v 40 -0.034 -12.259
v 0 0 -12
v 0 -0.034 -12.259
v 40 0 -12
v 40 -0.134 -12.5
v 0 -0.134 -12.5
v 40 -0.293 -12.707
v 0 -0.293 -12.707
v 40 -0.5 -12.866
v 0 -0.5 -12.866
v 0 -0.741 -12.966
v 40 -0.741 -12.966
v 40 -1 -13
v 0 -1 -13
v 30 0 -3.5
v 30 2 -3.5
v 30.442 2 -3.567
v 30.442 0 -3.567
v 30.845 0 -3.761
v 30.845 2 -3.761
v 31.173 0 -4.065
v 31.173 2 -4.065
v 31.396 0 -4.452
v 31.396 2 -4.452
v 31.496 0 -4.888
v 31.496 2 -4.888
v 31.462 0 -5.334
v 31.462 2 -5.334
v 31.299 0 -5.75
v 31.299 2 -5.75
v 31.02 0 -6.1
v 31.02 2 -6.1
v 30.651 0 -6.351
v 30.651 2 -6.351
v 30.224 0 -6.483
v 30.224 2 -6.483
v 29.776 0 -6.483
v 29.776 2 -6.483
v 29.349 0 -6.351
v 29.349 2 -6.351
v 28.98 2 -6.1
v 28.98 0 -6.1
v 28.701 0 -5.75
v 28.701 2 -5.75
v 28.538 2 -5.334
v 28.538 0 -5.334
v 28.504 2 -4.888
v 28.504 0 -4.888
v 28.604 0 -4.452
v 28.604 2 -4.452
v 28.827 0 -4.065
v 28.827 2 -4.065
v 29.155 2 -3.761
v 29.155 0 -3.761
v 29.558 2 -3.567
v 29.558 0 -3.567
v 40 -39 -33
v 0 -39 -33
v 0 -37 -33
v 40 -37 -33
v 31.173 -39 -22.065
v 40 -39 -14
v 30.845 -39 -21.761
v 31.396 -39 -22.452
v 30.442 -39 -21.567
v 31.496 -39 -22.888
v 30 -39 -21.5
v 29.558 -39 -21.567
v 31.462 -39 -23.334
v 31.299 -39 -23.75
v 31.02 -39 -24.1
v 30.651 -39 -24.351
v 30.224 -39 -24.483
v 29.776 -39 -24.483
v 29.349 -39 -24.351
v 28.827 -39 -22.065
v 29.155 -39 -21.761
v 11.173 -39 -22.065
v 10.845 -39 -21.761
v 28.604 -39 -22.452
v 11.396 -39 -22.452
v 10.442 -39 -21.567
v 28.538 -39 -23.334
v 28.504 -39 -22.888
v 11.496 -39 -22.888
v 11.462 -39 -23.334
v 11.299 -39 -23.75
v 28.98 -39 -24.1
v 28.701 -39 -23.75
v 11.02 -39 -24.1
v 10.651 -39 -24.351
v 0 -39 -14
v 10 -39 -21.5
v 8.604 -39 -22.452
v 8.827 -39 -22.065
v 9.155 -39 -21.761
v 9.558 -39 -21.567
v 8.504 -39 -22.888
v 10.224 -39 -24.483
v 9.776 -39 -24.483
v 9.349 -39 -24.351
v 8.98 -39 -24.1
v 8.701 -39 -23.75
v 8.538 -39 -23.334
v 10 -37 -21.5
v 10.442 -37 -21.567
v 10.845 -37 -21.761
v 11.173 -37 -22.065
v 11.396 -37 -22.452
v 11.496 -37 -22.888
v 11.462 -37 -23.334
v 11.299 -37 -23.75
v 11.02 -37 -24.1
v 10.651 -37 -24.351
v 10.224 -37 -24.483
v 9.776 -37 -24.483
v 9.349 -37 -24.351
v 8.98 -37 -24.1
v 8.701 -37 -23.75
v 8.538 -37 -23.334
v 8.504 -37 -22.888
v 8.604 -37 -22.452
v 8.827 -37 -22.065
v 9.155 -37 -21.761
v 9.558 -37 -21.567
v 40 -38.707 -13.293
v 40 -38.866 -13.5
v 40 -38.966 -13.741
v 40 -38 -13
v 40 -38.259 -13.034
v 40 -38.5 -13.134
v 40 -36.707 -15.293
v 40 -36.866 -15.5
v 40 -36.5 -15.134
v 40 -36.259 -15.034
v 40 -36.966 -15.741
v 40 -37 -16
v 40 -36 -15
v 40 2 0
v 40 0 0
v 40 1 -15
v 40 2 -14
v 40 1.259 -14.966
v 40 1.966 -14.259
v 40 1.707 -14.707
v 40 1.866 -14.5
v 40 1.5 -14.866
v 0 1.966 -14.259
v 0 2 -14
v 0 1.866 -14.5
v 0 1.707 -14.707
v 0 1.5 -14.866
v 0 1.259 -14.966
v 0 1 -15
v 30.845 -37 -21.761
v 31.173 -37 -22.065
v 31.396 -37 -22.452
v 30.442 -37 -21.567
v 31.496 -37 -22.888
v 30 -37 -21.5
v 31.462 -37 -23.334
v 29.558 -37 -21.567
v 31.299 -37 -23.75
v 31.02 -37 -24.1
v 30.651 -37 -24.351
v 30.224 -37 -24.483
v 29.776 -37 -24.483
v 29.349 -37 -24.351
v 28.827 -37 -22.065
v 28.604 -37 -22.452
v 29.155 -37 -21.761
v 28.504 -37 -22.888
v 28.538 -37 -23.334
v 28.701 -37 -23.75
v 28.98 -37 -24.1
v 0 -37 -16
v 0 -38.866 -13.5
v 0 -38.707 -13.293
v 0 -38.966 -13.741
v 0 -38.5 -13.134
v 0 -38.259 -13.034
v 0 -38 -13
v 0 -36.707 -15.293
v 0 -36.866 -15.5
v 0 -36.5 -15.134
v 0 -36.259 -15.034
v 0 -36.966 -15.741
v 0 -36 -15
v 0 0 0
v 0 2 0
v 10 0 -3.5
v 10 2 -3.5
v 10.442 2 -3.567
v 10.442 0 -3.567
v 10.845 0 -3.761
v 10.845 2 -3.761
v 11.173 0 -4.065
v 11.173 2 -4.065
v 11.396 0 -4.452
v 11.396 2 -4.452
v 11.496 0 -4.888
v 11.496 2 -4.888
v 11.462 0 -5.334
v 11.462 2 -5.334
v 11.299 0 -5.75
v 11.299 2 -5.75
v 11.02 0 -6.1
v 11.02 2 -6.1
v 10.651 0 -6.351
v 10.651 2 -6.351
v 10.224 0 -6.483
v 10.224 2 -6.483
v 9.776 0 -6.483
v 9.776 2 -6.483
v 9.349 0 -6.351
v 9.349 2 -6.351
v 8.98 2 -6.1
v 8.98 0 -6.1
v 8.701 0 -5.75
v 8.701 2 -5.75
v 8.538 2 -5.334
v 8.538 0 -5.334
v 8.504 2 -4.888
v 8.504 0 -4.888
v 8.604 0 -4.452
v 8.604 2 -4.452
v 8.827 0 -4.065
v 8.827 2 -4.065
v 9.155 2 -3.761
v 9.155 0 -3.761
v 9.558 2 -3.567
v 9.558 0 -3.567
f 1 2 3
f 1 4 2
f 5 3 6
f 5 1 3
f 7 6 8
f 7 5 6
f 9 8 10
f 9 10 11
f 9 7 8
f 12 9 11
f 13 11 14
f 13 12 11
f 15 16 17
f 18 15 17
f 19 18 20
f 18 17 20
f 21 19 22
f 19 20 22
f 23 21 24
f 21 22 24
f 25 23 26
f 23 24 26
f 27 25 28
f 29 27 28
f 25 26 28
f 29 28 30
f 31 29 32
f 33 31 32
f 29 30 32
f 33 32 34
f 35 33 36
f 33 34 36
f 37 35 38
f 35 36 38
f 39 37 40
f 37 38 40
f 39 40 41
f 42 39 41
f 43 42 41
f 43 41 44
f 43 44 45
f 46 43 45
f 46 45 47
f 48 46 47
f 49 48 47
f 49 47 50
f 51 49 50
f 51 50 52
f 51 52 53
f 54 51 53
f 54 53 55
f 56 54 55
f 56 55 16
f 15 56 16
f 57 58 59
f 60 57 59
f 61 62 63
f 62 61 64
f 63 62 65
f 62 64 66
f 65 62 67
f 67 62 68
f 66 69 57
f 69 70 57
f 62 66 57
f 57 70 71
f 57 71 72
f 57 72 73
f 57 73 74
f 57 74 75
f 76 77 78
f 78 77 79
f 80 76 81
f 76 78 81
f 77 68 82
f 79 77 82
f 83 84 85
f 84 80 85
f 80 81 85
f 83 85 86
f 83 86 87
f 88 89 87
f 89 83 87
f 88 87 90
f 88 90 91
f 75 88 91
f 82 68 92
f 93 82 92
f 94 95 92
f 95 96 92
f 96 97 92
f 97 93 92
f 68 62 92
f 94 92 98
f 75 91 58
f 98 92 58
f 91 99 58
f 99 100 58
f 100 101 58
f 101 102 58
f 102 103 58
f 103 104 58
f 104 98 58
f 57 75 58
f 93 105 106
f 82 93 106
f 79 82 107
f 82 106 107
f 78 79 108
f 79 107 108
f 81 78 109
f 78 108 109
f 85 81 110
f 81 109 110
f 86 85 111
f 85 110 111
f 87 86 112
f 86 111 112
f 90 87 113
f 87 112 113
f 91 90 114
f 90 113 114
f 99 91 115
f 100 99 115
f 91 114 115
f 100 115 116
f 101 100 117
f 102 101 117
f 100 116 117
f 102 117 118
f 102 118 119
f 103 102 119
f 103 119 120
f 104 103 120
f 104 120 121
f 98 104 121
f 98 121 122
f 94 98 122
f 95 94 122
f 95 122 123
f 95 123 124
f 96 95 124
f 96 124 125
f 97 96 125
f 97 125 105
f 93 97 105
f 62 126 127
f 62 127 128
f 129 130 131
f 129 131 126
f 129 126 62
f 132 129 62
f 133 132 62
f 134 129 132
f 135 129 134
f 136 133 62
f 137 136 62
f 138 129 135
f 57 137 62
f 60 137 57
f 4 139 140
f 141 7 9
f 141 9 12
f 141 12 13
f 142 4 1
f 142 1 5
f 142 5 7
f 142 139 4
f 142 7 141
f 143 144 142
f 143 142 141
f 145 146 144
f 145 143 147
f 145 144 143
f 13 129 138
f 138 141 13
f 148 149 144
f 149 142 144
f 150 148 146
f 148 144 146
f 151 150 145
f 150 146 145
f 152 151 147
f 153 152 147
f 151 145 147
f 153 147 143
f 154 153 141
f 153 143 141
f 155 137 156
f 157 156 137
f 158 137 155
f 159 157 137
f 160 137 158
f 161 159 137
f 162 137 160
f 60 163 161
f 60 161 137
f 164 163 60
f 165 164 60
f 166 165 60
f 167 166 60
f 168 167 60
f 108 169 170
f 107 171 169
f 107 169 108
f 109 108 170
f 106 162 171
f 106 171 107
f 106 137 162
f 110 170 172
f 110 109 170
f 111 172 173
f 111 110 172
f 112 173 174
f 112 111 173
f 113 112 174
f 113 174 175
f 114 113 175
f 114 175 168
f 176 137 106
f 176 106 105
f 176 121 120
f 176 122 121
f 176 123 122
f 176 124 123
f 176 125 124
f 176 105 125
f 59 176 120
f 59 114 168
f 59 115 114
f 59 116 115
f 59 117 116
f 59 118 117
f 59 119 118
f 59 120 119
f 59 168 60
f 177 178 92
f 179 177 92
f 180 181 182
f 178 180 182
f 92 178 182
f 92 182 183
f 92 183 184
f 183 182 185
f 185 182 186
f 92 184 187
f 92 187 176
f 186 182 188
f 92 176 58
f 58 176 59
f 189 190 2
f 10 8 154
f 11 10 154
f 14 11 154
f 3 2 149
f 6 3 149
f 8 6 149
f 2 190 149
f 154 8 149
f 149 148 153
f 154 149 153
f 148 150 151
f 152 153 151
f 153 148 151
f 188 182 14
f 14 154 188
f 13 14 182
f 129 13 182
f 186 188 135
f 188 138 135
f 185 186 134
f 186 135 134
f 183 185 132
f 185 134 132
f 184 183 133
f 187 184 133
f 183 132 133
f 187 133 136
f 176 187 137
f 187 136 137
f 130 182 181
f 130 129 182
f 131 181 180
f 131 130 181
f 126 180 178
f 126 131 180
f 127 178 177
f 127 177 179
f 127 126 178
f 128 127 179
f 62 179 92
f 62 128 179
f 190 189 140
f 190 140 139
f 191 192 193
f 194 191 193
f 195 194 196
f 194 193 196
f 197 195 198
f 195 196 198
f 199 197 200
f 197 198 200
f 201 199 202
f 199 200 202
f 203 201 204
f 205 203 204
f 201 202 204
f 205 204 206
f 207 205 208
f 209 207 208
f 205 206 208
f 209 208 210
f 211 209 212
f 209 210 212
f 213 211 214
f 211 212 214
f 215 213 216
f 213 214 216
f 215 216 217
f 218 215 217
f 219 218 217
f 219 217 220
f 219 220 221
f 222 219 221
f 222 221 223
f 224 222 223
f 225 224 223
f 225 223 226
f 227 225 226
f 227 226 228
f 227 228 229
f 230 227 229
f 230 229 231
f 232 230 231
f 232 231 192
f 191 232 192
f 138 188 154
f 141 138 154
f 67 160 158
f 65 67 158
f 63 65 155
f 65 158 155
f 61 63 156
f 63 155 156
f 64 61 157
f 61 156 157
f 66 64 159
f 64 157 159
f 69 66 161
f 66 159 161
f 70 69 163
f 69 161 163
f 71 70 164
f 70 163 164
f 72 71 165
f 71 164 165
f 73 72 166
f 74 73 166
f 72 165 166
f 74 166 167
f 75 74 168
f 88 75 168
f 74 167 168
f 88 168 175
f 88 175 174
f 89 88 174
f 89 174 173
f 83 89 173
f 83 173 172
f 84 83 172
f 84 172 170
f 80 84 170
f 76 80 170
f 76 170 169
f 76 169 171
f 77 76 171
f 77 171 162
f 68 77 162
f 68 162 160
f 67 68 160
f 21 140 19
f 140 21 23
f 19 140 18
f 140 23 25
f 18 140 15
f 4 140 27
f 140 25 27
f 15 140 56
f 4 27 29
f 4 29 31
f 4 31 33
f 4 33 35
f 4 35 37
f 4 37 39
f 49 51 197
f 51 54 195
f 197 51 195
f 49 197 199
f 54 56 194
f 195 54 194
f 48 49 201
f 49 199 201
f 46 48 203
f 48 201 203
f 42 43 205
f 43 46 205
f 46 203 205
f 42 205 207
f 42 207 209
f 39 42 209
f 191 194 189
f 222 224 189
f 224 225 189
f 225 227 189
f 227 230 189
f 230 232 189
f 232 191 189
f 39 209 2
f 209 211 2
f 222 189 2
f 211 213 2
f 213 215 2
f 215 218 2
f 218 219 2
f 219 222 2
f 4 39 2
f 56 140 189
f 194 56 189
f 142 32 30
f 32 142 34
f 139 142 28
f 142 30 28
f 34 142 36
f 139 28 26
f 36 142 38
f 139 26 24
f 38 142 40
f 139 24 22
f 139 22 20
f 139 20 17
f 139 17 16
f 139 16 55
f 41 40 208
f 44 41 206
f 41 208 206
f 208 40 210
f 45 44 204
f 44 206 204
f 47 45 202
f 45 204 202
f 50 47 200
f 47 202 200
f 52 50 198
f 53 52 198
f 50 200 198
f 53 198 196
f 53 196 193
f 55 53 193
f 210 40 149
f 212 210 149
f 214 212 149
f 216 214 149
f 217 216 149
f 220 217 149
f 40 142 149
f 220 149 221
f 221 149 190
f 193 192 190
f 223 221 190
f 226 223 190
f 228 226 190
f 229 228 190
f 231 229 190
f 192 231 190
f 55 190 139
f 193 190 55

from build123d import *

# Parameters (mm, degrees)
SKETCH1_W           = 13
SKETCH1_H           = 2
SKETCH1_W_2         = 2
SKETCH1_H_2         = 37
SKETCH1_W_3         = 18
BOSS_EXTRUDE1_DEPTH = 40
SKETCH2_R           = 1.5
CUT_EXTRUDE1_DEPTH  = 40
FILLET1_R           = 1
SKETCH4_R           = 1.5
CUT_EXTRUDE2_DEPTH  = 40


with BuildPart() as part:
    # Sketch1 → Boss-Extrude1 (new body)
    with BuildSketch(Plane(origin=(0, 0, 0), x_dir=(0, 0, -1), z_dir=(1, 0, 0))):
        with Locations((6.5, 1)):
            Rectangle(SKETCH1_W, SKETCH1_H)
        with Locations((14, 1)):
            Rectangle(SKETCH1_W_2, SKETCH1_H)
        with Locations((14, -18.5)):
            Rectangle(SKETCH1_W_2, SKETCH1_H_2)
        with Locations((24, -38)):
            Rectangle(SKETCH1_W_3, SKETCH1_H)
        with Locations((14, -38)):
            Rectangle(SKETCH1_W_2, SKETCH1_H)
    extrude(amount=BOSS_EXTRUDE1_DEPTH)

    # Sketch2 → Cut-Extrude1 (cut)
    with BuildSketch(Plane(origin=(0, 2, 0), x_dir=(1, 0, 0), z_dir=(0, 1, 0))):
        with Locations(Location((10, 5, 0), (0, 0, 270))):
            Circle(SKETCH2_R)
        with Locations(Location((30, 5, 0), (0, 0, 270))):
            Circle(SKETCH2_R)
    extrude(amount=-CUT_EXTRUDE1_DEPTH, mode=Mode.SUBTRACT)

    # Fillet1
    fillet1_edges = [part.edges().sort_by_distance(p)[0] for p in [
        (20, 2, -15),
        (20, -37, -15),
        (20, -39, -13),
        (20, 0, -13),
    ]]
    fillet(fillet1_edges, radius=FILLET1_R)

    # Sketch4 → Cut-Extrude2 (cut)
    with BuildSketch(Plane(origin=(0, -37, 0), x_dir=(1, 0, 0), z_dir=(0, 1, 0))):
        with Locations(Location((30, 23, 0), (0, 0, 270))):
            Circle(SKETCH4_R)
        with Locations(Location((10, 23, 0), (0, 0, 270))):
            Circle(SKETCH4_R)
    extrude(amount=-CUT_EXTRUDE2_DEPTH, mode=Mode.SUBTRACT)


solid = part.part
